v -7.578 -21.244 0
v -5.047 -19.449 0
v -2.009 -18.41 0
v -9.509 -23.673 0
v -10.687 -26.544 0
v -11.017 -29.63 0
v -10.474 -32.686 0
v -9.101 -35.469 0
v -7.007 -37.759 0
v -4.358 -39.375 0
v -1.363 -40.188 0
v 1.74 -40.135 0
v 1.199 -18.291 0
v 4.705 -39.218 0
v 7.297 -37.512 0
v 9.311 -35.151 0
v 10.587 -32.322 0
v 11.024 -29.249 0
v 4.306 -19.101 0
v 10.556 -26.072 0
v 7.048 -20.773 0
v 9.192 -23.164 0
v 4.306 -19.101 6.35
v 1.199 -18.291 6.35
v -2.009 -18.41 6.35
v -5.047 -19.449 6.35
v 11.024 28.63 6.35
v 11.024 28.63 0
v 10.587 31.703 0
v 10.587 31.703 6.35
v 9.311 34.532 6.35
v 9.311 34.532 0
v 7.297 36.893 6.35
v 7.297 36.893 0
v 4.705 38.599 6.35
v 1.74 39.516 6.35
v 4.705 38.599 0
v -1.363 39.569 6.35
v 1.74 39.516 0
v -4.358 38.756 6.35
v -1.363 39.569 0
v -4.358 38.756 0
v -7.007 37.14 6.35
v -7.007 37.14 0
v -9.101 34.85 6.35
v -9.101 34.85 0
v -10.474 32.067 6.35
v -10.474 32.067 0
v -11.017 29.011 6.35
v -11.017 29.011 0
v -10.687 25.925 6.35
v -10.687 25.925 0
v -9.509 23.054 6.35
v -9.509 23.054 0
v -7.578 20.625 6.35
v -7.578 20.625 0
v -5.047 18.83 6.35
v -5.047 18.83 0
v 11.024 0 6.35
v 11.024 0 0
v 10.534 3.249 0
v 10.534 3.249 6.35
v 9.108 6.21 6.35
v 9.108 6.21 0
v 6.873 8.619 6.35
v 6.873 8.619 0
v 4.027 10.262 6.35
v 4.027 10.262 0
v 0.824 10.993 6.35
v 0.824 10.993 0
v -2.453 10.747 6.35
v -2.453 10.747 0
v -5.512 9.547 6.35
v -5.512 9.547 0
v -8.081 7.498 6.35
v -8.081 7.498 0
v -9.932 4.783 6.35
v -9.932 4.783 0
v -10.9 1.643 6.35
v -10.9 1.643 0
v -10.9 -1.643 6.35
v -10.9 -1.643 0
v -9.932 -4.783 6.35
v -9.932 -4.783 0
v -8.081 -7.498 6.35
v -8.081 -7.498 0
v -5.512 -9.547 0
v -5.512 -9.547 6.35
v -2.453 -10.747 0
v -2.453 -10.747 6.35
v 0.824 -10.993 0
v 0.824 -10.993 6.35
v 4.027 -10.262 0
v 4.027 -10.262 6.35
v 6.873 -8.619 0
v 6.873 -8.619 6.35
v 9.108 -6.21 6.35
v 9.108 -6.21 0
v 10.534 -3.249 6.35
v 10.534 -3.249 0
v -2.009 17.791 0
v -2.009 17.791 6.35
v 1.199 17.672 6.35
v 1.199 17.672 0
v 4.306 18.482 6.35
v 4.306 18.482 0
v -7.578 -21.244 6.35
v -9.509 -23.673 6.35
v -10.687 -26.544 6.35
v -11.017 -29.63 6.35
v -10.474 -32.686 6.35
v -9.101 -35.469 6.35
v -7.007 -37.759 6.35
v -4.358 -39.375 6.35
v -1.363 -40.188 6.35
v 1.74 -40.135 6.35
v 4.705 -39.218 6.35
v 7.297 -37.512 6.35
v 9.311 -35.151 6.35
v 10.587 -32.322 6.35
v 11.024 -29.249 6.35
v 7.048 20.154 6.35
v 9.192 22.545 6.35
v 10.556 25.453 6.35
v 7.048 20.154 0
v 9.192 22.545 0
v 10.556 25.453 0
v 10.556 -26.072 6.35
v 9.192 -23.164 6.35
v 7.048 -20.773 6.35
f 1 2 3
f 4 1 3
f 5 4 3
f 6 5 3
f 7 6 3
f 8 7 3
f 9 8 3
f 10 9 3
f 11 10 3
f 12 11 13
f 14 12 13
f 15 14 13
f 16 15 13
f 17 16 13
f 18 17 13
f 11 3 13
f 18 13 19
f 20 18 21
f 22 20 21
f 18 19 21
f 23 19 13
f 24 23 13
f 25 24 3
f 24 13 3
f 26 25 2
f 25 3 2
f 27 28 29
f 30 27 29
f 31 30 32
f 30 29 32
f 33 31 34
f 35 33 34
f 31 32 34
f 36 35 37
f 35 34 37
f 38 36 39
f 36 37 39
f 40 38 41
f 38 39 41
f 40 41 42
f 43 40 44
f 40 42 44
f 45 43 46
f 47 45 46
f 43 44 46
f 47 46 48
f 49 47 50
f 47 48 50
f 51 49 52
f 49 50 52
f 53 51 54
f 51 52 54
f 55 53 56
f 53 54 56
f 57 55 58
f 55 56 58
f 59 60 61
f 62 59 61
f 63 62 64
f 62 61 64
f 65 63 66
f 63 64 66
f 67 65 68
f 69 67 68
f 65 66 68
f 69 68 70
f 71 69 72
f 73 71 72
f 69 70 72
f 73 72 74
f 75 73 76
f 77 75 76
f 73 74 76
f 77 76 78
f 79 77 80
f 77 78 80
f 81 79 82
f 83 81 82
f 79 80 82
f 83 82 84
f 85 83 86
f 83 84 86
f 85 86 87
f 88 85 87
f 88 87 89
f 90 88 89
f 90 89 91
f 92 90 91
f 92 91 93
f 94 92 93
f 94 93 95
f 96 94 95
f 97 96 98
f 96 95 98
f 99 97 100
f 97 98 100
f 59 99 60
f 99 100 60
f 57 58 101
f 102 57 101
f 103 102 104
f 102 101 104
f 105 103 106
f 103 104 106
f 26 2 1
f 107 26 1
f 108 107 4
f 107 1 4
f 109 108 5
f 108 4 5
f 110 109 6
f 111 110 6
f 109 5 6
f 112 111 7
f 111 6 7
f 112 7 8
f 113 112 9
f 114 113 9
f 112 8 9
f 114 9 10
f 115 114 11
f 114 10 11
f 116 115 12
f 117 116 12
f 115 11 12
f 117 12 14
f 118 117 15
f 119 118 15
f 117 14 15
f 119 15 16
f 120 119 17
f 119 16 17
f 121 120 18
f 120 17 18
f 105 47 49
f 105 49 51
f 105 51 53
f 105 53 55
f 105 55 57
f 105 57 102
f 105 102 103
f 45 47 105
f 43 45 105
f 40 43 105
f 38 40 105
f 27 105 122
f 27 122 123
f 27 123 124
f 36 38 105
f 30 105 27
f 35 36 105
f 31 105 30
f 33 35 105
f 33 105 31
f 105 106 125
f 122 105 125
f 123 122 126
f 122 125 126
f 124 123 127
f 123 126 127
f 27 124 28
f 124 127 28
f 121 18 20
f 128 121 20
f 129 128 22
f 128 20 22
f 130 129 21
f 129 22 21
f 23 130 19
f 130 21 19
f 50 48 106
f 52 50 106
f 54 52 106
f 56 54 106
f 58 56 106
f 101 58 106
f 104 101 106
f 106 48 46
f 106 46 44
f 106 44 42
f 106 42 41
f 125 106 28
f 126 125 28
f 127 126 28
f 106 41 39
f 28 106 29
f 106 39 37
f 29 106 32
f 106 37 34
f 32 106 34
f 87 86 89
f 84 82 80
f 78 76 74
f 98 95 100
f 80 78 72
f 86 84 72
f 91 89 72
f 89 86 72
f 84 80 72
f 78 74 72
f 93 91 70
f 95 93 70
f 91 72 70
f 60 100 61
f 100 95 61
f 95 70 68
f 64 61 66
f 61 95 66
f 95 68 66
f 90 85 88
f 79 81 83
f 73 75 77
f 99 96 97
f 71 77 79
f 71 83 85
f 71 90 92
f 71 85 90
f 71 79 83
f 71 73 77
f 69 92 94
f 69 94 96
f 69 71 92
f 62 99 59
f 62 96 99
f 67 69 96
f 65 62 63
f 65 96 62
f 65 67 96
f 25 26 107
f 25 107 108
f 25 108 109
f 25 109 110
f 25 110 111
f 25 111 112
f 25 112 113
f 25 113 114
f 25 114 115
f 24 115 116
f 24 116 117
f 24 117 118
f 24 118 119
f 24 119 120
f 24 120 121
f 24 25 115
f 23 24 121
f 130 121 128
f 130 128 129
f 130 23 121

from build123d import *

# Parameters (mm, degrees)
F0_R     = 11.0236
F2_DEPTH = 6.35


with BuildPart() as f2:
    # F0 (on Top) + F1 (on Top) → F2 (new body)
    with BuildSketch(Plane.XY):
        Circle(F0_R)
    with BuildSketch(Plane.XY):
        with BuildLine():
            ThreePointArc((4.305905, 18.482418), (9.192017, 22.545324), (11.0236, 28.630272))
            ThreePointArc((11.0236, 28.630272), (-5.739722, 38.041719), (-5.04653, 18.829644))
            ThreePointArc((-5.04653, 18.829644), (-0.40899, 17.614261), (4.305905, 18.482418))
        make_face()
        with BuildLine():
            ThreePointArc((-5.04653, -19.448678), (-5.739722, -38.660752), (11.0236, -29.249305))
            ThreePointArc((11.0236, -29.249305), (9.192017, -23.164357), (4.305905, -19.101451))
            ThreePointArc((4.305905, -19.101451), (-0.40899, -18.233295), (-5.04653, -19.448678))
        make_face()
    extrude(amount=F2_DEPTH)


solid = f2.part
